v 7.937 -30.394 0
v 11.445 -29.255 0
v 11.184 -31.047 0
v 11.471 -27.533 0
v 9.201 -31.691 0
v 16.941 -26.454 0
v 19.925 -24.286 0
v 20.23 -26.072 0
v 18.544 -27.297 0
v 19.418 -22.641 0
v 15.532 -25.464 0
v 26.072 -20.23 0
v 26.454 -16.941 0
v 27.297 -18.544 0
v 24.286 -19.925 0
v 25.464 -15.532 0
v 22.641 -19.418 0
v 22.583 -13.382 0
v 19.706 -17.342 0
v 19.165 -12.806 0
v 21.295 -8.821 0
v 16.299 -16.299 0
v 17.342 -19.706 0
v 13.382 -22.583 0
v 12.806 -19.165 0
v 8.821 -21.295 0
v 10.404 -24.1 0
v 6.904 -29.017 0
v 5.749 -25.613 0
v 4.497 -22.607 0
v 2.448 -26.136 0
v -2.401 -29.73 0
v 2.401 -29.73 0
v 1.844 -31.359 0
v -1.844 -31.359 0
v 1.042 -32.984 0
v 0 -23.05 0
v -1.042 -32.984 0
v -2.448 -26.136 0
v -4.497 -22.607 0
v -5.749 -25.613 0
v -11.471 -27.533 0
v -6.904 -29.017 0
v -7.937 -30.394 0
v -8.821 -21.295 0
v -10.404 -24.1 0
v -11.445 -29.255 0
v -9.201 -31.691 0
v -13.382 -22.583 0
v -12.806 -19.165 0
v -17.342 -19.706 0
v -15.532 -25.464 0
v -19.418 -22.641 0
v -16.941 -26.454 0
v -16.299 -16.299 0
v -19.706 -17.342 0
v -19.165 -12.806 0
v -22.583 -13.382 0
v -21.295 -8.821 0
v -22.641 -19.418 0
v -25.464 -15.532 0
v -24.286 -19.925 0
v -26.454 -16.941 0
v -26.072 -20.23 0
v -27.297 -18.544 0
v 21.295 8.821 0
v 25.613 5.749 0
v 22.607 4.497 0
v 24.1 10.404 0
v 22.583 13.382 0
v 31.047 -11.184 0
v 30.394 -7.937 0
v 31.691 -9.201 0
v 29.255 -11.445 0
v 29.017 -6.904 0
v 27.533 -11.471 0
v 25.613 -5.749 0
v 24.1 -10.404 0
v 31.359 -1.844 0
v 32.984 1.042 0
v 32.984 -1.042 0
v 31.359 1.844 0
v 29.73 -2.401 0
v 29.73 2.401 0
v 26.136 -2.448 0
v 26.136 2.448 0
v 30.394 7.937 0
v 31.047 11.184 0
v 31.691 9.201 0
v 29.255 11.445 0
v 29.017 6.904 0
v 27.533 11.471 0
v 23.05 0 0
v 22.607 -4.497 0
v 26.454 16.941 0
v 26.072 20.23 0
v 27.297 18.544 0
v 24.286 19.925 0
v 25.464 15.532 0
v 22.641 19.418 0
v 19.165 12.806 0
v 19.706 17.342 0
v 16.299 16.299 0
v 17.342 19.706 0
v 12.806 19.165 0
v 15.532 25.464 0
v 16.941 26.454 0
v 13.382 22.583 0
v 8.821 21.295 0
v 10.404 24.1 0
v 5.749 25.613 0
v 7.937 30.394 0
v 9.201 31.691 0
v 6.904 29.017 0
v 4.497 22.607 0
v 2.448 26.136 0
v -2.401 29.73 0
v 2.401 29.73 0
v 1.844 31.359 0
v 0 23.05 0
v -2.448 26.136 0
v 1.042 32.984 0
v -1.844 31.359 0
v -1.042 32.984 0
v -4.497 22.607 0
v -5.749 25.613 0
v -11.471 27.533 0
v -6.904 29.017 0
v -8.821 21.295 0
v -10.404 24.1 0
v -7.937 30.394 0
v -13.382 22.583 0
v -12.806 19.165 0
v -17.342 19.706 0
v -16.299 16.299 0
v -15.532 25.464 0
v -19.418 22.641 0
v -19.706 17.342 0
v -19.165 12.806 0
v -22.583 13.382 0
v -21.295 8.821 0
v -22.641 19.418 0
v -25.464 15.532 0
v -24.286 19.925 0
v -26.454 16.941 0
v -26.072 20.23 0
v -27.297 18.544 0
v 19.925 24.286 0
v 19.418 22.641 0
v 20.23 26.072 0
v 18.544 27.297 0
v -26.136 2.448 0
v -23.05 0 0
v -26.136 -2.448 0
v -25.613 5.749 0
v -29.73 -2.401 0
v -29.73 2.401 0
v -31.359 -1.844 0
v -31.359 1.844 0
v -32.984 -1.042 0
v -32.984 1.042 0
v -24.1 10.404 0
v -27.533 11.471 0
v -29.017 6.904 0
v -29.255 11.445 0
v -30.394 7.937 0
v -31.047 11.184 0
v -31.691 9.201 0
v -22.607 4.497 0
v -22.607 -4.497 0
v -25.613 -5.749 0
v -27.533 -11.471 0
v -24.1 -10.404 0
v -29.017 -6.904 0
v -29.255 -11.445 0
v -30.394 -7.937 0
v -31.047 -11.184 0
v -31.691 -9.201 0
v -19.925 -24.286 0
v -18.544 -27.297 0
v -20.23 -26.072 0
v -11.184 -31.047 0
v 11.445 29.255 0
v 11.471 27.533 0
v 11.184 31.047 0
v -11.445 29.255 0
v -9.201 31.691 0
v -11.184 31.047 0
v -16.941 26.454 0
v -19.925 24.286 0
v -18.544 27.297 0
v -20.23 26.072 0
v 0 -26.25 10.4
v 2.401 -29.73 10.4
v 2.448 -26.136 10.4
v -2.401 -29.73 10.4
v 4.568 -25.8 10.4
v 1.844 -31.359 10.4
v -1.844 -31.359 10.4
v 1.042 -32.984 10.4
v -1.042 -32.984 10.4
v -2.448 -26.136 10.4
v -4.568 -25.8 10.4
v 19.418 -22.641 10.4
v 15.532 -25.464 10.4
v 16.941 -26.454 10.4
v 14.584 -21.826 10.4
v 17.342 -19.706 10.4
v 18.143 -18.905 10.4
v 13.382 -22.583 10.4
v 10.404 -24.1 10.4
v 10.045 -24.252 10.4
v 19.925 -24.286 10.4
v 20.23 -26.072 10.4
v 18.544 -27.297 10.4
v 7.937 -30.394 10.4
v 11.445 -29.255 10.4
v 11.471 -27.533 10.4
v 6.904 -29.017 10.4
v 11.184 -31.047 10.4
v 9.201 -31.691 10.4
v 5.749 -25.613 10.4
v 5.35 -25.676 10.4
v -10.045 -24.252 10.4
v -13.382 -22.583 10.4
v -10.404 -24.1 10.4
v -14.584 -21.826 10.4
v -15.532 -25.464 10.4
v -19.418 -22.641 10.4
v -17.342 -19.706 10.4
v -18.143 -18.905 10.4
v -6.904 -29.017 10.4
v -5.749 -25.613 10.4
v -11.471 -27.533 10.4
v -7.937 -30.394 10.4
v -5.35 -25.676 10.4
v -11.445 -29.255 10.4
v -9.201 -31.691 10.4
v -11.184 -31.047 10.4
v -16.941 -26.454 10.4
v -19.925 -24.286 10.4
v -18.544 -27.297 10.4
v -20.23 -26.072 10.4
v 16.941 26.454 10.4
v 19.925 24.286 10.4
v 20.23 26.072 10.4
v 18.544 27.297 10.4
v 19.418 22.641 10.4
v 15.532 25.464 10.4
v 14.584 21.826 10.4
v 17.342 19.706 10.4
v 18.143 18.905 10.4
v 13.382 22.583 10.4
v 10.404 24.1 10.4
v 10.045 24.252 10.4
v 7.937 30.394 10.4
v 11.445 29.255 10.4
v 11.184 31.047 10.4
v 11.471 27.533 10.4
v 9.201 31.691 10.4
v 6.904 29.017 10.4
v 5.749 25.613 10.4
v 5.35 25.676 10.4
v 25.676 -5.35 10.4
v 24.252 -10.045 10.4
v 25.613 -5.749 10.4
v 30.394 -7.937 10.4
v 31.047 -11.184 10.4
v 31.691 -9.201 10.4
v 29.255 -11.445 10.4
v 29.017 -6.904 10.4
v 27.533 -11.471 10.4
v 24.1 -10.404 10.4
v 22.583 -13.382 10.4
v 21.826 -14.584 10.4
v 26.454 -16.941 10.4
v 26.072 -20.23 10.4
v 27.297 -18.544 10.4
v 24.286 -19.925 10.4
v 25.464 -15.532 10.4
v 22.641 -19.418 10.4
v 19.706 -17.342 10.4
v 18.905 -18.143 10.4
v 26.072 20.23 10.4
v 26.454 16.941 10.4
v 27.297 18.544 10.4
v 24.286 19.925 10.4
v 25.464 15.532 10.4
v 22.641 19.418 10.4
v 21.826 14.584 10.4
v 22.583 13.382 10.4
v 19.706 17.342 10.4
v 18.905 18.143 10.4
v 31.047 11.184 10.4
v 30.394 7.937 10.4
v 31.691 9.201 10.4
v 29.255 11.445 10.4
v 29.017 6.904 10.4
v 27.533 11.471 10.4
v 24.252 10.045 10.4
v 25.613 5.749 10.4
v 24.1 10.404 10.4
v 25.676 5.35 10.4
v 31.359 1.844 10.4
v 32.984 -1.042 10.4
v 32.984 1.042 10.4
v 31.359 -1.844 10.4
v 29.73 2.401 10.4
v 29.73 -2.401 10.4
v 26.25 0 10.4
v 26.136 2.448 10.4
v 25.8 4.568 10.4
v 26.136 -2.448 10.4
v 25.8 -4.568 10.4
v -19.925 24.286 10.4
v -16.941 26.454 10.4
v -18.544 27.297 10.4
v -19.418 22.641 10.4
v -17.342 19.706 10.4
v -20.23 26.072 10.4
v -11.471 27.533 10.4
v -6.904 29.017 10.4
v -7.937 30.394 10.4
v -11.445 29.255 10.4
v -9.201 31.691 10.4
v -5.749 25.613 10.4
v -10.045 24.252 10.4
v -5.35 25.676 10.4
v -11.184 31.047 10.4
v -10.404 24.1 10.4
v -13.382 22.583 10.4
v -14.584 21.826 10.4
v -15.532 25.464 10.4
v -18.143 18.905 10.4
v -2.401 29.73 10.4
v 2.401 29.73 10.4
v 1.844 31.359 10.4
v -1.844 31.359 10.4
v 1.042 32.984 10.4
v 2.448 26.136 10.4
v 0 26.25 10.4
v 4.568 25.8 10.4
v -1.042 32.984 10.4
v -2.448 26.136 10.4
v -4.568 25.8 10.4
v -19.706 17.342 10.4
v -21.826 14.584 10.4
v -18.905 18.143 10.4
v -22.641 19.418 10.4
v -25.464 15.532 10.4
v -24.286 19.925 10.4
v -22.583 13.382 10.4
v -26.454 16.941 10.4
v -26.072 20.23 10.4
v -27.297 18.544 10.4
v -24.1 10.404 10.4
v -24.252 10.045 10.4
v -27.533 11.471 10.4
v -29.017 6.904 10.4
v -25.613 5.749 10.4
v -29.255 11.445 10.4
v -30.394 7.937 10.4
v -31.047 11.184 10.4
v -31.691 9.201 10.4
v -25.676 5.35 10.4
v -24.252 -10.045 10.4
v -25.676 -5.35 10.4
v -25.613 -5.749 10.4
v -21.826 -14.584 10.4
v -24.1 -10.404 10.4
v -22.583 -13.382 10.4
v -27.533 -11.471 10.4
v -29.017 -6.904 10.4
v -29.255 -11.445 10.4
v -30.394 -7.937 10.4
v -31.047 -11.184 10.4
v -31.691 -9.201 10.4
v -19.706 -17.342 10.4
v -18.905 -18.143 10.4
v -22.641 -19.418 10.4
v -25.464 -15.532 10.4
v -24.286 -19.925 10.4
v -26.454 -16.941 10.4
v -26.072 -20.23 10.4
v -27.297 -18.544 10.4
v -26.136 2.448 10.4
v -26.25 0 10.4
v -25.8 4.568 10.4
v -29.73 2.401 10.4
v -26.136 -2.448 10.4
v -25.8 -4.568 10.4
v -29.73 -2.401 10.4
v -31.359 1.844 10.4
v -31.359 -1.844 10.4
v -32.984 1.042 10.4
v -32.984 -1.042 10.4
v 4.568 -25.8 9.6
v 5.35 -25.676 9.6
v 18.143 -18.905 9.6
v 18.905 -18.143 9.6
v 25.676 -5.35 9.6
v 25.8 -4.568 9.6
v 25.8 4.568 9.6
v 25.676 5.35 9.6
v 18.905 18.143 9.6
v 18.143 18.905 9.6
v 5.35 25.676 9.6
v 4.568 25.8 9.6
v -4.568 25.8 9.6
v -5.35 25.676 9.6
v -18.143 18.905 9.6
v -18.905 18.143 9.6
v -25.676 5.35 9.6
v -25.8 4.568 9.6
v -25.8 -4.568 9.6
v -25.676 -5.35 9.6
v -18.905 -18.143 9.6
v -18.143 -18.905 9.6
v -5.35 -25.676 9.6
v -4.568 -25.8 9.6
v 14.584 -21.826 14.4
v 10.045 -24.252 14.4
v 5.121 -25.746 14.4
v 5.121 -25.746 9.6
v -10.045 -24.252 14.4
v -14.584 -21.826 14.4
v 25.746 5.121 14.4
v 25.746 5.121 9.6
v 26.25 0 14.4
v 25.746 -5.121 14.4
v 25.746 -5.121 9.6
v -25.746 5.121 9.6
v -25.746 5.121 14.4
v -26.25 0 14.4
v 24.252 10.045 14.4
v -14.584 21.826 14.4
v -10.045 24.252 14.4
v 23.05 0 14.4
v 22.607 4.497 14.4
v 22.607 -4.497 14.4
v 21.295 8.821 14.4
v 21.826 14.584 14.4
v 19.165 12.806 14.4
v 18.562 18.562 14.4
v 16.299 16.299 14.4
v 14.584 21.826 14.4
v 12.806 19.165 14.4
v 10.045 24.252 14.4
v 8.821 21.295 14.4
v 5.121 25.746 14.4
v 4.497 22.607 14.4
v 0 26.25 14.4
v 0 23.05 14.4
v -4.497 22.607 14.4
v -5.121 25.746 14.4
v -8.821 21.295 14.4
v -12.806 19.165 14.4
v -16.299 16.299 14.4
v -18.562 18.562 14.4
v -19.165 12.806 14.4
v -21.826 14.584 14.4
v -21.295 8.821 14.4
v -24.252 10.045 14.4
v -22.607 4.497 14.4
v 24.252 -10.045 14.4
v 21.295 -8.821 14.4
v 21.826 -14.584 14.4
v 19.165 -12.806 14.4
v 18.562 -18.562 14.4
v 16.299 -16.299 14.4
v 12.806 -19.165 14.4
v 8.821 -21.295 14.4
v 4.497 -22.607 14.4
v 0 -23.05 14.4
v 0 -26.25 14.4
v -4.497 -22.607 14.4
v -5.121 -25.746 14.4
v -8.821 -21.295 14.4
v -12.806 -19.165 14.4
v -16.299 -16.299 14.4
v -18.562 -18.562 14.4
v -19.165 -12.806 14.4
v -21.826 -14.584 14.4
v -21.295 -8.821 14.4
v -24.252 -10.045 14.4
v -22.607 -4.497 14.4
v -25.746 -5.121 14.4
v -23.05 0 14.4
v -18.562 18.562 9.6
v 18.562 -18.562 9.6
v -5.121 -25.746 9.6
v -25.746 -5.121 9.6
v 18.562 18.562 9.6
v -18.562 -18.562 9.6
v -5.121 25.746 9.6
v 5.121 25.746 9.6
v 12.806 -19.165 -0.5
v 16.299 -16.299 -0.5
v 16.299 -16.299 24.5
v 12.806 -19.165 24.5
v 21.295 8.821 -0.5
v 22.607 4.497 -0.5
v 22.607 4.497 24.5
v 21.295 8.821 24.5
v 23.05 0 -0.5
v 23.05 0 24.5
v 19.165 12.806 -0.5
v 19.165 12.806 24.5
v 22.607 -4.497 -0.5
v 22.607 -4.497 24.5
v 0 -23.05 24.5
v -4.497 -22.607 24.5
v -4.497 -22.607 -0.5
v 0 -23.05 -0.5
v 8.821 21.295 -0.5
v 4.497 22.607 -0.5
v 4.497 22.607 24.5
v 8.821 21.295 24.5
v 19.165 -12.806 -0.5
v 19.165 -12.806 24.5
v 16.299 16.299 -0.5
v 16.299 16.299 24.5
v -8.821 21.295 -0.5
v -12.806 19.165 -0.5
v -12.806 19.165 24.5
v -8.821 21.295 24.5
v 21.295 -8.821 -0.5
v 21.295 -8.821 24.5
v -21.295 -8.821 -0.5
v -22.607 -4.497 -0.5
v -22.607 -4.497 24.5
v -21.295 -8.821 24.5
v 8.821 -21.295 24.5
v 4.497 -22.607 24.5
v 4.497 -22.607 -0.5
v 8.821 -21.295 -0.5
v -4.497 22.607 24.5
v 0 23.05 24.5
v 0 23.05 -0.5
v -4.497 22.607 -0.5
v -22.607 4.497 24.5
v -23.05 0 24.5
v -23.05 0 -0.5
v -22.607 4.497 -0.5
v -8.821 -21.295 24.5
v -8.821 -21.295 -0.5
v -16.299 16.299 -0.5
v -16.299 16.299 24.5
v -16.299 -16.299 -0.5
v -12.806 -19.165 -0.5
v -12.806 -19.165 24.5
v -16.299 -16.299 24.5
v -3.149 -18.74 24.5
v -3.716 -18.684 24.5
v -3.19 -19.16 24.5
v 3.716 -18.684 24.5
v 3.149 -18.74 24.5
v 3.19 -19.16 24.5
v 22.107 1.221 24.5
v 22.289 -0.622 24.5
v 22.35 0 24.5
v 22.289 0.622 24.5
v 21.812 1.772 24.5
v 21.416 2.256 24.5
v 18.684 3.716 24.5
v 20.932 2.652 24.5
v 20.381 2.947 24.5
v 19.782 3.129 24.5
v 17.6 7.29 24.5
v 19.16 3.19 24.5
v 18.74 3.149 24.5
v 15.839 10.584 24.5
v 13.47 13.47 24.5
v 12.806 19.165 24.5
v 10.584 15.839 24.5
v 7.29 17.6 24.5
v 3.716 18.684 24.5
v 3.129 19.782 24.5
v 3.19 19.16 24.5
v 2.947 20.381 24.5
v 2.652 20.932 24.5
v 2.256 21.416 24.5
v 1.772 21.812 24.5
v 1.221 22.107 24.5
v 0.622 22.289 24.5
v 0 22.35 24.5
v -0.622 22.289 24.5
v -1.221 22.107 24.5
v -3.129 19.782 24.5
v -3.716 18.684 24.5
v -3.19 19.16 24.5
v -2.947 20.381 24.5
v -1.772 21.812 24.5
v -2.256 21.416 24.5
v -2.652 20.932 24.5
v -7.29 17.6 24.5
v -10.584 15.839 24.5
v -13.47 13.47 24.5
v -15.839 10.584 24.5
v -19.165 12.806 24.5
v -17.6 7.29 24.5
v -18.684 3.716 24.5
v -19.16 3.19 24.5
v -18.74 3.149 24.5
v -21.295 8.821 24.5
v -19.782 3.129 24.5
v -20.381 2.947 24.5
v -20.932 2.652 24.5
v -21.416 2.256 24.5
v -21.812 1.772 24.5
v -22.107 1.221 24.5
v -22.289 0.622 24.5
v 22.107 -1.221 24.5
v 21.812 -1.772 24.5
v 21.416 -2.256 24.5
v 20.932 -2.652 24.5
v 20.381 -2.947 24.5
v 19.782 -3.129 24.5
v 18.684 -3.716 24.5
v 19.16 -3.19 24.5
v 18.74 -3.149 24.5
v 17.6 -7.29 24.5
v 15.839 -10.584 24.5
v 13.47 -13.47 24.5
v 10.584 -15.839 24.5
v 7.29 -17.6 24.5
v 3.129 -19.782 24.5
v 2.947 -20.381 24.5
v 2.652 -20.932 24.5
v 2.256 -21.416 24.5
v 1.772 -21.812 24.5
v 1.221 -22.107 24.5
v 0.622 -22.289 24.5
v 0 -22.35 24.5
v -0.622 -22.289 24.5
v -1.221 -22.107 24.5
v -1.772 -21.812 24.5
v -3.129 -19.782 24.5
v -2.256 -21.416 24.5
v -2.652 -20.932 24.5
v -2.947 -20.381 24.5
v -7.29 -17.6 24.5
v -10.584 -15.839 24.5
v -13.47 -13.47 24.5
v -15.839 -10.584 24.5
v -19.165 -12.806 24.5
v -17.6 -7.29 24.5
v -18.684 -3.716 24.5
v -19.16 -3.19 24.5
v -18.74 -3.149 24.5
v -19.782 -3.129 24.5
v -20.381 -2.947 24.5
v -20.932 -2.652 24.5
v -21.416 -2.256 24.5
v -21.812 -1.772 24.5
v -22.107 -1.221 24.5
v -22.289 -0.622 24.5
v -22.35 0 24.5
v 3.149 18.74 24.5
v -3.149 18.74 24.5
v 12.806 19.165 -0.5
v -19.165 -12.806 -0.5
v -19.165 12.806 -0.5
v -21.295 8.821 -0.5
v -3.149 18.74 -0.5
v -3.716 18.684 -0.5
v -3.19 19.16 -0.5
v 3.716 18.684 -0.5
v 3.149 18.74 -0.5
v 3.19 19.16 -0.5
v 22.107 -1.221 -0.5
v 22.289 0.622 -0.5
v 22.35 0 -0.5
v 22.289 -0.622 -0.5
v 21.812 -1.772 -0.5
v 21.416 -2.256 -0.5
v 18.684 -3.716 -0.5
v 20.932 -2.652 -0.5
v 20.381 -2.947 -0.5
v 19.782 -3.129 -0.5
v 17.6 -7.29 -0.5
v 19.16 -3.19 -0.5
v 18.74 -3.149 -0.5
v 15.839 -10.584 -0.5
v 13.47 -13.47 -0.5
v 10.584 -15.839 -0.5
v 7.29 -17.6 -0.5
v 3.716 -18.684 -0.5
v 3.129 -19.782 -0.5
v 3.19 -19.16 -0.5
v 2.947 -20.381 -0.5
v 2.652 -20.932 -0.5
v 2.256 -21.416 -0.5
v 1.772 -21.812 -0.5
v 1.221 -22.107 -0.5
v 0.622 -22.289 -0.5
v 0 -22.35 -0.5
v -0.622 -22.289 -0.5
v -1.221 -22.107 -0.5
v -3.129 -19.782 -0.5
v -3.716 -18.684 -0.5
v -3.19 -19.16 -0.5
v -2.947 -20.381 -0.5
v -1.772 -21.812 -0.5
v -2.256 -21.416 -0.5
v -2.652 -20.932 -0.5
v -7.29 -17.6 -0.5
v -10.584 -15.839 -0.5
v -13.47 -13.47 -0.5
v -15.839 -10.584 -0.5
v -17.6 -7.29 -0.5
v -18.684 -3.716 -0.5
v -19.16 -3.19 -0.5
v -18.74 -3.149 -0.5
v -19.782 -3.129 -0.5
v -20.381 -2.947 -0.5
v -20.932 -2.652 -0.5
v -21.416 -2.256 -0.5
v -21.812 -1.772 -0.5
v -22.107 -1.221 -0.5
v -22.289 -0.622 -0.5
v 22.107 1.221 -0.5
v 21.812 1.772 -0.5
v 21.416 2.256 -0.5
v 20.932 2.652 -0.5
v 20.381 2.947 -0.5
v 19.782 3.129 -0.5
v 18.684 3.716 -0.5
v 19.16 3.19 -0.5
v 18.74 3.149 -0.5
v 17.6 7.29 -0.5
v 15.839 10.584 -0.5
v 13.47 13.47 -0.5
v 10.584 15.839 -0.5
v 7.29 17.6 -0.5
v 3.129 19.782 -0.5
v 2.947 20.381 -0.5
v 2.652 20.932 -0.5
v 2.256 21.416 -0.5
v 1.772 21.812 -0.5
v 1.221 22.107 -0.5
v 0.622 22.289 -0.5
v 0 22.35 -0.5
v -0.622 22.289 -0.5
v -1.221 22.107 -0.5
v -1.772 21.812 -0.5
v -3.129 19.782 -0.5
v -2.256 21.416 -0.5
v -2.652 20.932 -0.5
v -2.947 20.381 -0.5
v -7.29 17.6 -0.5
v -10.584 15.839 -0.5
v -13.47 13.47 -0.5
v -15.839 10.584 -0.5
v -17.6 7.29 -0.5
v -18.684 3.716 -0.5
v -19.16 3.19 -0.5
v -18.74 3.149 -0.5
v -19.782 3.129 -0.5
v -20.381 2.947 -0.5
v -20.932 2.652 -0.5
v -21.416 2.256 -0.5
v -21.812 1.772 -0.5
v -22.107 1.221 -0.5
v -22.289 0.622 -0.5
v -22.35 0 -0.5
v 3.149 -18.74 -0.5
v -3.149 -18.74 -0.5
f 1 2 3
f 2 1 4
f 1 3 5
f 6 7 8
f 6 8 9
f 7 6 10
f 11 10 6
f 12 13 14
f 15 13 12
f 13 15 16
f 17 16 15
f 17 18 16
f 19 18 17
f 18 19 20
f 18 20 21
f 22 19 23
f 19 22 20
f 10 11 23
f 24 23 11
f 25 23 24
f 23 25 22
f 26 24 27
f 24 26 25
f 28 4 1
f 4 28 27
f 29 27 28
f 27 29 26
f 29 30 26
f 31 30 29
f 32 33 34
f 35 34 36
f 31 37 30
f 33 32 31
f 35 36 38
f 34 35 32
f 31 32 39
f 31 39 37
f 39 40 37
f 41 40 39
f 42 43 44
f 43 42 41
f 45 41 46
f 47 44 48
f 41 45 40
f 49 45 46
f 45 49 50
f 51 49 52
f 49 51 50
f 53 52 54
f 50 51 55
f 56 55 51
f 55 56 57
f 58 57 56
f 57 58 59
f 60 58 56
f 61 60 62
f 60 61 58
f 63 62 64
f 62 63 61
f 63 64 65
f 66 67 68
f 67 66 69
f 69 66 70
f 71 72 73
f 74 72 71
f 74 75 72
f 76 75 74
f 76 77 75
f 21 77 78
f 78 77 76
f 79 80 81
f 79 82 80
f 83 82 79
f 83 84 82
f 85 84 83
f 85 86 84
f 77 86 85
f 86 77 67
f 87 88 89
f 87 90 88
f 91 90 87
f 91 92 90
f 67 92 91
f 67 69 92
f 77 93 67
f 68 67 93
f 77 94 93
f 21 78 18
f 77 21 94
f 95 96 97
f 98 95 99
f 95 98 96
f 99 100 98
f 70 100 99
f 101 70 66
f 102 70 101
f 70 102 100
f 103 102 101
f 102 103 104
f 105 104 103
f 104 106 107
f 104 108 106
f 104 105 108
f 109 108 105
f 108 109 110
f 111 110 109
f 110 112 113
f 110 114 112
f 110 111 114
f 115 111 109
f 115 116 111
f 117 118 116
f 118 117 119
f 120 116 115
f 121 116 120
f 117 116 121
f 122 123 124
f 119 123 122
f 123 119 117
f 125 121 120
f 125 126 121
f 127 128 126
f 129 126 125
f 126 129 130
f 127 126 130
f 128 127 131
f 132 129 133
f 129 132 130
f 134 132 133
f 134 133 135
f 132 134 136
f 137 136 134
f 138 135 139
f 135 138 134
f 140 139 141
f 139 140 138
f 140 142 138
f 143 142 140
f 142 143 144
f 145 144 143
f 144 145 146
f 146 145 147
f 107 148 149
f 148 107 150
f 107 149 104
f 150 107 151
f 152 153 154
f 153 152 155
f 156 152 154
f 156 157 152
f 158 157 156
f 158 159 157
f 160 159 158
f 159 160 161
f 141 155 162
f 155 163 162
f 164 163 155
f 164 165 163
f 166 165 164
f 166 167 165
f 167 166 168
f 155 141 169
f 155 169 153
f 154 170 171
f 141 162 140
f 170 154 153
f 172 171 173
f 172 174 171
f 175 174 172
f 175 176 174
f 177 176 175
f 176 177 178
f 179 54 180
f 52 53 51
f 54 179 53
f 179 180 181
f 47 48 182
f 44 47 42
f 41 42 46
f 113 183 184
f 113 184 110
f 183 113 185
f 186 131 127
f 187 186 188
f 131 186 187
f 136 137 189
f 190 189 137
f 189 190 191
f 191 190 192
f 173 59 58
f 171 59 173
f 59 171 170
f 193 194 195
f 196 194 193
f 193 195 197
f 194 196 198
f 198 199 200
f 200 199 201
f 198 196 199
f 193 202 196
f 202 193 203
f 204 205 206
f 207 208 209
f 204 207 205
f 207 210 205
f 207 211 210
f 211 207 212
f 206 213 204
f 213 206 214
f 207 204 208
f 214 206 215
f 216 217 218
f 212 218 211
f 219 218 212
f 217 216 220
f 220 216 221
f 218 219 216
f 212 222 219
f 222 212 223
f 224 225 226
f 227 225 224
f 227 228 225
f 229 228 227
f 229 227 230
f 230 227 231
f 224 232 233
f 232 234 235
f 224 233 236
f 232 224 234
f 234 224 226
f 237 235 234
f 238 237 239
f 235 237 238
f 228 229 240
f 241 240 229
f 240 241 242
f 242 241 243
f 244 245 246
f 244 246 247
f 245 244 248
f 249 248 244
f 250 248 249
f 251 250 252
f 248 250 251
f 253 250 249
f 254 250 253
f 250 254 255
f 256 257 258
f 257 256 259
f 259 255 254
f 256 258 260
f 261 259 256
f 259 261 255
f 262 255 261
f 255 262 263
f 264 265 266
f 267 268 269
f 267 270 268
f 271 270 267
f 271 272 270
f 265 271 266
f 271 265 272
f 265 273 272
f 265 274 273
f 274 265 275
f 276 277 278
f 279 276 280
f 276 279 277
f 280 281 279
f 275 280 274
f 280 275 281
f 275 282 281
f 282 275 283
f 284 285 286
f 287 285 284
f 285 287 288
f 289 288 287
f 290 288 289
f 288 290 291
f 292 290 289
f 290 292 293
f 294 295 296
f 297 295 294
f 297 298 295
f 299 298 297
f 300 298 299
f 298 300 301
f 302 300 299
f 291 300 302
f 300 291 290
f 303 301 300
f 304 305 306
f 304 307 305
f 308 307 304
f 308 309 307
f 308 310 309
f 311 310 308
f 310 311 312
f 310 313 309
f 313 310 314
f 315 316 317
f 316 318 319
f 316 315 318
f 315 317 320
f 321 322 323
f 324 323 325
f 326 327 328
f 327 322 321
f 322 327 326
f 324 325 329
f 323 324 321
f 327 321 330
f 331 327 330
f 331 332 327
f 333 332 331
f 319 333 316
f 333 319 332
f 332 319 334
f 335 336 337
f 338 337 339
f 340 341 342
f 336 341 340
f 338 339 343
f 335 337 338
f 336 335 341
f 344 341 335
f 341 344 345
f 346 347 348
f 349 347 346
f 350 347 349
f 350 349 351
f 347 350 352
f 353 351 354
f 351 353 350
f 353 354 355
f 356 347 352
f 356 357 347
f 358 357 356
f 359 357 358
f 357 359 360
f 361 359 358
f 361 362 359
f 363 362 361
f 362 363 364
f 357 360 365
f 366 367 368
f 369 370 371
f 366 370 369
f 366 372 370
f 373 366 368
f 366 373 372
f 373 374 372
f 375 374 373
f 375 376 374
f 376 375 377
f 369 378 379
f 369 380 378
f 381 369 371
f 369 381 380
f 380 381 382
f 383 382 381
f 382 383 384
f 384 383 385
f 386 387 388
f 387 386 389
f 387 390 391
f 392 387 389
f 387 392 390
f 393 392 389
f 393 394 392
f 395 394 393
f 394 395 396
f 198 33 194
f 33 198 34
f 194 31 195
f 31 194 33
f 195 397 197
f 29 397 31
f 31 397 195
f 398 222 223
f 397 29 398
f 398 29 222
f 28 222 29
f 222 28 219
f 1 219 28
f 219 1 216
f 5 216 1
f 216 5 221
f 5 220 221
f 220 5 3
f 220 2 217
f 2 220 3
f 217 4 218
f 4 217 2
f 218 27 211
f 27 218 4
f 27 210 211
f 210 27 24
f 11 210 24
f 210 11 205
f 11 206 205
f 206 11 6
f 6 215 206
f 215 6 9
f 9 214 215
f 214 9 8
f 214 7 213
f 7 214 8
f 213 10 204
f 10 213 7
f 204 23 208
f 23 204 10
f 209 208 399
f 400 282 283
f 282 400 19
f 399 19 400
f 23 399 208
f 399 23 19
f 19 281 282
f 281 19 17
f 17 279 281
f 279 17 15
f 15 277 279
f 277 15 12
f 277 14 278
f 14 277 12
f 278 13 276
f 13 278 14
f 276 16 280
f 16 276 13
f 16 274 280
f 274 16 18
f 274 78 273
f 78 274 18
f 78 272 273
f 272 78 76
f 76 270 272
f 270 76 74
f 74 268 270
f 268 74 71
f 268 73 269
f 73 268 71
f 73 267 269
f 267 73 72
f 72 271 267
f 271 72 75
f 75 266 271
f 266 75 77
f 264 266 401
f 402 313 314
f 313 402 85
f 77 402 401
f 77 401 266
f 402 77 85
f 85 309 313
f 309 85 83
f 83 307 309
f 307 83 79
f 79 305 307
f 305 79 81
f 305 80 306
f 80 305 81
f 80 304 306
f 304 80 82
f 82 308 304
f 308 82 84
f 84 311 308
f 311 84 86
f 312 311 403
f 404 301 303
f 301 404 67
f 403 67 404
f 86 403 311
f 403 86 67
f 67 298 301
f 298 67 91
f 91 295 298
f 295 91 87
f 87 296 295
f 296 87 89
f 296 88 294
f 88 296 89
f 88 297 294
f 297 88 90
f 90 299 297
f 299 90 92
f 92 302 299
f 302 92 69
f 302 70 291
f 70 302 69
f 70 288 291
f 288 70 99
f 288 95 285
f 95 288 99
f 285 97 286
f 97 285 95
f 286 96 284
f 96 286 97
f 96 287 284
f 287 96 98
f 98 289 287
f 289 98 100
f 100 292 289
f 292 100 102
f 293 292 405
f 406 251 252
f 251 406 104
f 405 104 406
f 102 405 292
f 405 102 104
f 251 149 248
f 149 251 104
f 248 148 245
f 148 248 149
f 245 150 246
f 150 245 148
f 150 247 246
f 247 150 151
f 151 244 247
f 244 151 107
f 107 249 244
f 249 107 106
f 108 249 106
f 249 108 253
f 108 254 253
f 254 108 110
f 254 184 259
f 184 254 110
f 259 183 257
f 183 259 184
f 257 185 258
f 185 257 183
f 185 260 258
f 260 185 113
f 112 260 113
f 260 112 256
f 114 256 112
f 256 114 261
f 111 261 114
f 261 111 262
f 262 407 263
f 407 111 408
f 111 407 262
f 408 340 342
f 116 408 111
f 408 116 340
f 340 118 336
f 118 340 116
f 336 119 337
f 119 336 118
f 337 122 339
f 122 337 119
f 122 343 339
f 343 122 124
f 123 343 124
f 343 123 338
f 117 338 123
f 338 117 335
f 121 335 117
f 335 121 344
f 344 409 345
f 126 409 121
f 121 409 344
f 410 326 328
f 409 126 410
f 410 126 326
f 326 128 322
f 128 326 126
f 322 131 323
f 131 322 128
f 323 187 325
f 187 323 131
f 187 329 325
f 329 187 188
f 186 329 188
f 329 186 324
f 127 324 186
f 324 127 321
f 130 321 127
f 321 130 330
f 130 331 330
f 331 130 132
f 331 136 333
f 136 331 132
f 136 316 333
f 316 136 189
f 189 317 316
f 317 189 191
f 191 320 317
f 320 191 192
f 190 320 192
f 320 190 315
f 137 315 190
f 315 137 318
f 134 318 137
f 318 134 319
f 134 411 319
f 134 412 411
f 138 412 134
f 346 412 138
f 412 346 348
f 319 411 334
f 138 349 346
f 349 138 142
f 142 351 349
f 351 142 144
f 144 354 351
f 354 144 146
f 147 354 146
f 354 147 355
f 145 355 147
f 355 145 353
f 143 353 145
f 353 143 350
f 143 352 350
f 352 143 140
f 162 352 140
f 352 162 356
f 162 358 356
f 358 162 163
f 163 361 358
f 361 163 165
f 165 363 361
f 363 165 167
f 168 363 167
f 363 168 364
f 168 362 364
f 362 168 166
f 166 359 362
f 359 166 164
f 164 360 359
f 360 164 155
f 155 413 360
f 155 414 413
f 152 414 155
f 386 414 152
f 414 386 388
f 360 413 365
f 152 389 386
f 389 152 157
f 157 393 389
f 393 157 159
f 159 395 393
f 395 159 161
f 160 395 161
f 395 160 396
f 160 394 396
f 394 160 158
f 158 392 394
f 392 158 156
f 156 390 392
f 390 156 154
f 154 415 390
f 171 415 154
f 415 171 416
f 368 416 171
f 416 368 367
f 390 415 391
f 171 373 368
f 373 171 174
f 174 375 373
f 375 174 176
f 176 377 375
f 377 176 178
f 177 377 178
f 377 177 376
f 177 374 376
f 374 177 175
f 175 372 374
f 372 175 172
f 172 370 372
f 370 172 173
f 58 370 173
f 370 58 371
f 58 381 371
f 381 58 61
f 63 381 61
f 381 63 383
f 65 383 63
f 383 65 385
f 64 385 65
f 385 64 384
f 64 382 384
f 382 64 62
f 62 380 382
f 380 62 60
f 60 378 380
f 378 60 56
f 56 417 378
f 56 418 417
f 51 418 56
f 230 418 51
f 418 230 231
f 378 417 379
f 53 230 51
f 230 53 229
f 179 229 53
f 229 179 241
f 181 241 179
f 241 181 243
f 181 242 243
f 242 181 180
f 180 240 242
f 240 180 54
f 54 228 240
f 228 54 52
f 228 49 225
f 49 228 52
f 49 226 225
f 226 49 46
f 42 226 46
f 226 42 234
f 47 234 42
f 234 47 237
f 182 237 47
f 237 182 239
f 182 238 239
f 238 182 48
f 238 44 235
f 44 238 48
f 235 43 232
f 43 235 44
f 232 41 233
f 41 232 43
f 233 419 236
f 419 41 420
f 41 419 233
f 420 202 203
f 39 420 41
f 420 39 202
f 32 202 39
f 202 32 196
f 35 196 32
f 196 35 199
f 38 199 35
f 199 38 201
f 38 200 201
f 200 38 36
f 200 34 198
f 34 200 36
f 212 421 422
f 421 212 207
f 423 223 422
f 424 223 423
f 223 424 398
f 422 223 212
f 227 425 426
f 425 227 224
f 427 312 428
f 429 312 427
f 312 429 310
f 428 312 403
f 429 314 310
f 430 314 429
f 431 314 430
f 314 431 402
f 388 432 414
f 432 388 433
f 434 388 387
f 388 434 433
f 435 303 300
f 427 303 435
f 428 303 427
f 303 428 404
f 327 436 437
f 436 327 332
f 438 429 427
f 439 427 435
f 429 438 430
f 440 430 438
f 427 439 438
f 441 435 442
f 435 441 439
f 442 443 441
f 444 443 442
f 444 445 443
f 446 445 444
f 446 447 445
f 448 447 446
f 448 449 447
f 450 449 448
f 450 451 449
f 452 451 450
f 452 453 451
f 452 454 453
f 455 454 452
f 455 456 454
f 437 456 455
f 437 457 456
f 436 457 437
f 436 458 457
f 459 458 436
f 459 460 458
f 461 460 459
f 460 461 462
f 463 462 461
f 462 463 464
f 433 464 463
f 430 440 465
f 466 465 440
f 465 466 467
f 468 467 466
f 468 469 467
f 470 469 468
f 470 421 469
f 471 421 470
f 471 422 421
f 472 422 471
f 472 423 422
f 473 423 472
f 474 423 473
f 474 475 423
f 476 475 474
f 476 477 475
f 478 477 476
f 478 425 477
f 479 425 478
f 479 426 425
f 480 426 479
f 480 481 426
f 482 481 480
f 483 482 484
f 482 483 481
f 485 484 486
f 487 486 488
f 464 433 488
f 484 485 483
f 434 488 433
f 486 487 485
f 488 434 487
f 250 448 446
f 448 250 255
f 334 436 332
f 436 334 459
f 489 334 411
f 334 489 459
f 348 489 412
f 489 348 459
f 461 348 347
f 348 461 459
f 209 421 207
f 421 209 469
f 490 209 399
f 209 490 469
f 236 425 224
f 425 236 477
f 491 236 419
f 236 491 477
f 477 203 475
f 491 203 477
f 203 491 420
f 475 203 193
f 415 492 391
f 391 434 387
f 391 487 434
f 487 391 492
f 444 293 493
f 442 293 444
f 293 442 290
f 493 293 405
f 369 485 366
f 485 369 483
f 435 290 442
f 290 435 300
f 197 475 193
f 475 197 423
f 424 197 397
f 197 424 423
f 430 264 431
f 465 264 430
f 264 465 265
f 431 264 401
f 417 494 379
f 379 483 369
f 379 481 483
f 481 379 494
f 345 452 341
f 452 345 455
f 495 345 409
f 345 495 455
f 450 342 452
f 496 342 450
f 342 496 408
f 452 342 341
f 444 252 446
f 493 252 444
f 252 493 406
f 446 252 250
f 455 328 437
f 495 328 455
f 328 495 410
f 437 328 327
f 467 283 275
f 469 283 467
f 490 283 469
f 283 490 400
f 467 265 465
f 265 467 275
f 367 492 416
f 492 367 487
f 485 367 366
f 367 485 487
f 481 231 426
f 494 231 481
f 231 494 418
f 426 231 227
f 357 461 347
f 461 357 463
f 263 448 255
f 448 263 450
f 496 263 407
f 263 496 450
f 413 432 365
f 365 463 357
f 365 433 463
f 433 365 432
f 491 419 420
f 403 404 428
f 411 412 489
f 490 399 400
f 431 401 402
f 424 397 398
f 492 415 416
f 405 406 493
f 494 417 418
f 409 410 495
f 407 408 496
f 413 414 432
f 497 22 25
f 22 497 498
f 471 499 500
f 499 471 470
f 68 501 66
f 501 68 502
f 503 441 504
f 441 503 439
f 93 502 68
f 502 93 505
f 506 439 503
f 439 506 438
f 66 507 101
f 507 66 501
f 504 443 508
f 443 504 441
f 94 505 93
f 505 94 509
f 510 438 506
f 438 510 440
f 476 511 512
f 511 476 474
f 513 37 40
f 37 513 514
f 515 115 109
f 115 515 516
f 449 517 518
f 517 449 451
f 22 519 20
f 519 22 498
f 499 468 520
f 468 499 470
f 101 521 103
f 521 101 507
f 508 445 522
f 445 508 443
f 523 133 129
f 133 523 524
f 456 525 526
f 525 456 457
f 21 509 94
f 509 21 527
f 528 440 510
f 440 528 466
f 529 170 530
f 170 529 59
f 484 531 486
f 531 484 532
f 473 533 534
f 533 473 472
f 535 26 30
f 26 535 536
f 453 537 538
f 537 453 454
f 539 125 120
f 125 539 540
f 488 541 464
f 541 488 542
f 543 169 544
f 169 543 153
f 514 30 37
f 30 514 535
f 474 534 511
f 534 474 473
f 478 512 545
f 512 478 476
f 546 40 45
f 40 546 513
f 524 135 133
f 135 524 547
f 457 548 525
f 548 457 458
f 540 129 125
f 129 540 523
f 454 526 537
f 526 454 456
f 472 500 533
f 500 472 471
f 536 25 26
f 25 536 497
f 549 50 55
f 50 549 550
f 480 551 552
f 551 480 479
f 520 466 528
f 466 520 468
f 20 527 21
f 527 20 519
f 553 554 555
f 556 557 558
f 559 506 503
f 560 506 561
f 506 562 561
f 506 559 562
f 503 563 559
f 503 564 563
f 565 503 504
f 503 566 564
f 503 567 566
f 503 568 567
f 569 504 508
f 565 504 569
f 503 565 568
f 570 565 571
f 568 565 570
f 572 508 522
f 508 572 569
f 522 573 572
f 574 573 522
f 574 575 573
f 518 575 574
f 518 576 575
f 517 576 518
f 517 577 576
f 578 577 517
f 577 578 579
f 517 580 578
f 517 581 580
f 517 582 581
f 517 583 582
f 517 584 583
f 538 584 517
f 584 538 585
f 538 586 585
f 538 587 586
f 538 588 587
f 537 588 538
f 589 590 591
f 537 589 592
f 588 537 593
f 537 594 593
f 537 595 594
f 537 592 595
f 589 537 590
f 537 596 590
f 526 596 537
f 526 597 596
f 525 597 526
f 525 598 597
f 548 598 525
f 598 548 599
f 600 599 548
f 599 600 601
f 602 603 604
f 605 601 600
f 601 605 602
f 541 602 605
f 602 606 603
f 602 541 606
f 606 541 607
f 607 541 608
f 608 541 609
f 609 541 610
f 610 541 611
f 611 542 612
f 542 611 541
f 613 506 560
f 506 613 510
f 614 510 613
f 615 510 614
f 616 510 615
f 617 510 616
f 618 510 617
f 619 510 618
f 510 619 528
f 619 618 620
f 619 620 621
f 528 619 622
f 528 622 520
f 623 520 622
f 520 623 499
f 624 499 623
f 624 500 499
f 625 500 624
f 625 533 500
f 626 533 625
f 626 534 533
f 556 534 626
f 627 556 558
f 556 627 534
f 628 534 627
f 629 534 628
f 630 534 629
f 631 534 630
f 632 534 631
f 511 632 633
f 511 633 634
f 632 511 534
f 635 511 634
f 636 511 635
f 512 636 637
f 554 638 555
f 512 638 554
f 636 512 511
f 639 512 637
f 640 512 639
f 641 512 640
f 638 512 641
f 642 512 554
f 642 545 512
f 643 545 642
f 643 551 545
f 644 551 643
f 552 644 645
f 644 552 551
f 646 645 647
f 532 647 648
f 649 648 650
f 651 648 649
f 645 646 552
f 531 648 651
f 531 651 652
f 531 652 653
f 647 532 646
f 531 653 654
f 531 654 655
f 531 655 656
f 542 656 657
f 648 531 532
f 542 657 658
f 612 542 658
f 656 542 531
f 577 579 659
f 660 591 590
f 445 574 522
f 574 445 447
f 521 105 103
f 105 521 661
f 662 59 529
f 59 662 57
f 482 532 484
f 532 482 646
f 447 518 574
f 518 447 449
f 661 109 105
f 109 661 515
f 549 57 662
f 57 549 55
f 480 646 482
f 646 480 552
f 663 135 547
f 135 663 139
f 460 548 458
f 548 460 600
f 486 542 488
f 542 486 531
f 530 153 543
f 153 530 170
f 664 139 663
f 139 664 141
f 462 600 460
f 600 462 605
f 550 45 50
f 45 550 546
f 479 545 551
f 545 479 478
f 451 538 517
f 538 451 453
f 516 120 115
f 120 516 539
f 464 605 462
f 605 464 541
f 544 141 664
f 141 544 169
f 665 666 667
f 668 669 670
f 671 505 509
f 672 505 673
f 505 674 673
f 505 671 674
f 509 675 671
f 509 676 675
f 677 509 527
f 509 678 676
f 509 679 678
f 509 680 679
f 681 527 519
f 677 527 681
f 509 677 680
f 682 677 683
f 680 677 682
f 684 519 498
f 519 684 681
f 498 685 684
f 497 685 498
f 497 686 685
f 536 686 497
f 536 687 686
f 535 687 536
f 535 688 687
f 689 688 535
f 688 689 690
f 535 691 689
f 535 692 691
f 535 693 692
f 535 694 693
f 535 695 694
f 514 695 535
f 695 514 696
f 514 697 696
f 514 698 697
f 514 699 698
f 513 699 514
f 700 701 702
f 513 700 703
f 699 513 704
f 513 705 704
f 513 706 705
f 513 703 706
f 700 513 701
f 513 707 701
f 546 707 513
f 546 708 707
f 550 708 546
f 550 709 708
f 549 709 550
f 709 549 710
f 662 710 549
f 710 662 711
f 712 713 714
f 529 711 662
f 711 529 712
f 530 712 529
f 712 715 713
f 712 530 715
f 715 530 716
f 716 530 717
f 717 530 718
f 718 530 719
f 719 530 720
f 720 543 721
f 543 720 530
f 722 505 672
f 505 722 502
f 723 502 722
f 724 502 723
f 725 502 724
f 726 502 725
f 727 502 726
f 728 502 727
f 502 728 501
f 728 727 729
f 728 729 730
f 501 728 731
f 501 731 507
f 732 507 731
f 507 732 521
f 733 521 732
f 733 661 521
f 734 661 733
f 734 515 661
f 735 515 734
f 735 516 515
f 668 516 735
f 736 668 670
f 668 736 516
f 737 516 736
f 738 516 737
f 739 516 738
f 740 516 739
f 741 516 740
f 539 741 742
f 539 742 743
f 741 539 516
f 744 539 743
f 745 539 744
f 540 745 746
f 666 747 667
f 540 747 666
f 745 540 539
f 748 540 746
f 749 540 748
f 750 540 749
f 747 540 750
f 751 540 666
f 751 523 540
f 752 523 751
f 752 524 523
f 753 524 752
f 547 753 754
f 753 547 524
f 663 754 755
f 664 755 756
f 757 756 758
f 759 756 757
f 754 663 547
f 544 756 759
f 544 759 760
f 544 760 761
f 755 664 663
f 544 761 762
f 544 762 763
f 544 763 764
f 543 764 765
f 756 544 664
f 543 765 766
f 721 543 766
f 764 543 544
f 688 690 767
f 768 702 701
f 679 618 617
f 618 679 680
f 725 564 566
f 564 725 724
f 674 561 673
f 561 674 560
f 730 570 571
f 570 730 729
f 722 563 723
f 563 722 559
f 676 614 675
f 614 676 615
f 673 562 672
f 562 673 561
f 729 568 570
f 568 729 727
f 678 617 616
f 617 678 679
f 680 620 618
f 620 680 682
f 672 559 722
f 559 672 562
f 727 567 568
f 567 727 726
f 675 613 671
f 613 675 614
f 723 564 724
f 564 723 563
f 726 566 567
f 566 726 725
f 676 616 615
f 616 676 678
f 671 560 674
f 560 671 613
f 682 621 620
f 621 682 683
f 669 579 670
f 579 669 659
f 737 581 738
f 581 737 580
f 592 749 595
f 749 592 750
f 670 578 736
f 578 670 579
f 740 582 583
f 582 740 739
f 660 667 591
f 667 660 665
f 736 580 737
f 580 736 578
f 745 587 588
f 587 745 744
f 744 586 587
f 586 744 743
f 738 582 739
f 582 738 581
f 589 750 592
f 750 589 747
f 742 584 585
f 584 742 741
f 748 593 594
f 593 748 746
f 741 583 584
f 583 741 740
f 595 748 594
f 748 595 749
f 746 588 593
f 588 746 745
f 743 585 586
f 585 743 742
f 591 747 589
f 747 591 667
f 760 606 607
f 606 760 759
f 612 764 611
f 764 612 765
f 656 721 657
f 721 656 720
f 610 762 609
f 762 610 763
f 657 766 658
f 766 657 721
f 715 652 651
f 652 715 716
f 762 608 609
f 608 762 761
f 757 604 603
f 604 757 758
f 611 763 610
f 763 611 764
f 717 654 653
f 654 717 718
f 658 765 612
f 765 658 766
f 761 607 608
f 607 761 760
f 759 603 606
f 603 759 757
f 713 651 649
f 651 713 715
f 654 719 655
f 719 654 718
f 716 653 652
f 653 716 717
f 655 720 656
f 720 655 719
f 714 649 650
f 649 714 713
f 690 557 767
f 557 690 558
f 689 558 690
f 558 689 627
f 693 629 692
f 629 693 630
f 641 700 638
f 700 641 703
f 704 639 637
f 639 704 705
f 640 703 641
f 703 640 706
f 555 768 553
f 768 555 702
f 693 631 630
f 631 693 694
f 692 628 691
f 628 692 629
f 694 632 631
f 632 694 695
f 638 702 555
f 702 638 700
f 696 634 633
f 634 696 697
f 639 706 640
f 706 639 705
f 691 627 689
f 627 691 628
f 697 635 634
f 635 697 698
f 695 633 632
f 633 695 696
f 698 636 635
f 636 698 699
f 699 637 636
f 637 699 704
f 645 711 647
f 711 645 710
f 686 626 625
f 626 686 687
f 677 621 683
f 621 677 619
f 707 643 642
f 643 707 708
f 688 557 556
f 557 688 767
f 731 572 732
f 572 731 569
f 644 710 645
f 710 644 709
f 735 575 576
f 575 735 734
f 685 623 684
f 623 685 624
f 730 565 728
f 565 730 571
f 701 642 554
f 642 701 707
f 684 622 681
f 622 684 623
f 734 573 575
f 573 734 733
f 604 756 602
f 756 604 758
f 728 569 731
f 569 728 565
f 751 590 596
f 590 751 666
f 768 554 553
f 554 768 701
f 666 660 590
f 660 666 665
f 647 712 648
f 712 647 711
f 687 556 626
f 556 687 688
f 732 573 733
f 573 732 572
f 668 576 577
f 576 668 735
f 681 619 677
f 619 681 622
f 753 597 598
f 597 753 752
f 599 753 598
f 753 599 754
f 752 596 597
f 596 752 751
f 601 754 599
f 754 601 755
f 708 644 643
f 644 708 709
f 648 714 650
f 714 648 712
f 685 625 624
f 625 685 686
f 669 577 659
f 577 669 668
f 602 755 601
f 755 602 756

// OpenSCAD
$fn = 32;

// ----------------------------------------------------------------------
// Two-module gear rim: z20 m3 and z18 m1.8, 24 mm wide
// ----------------------------------------------------------------------

// --- parameters (mm) ---
module_a = 3;             // first tooth module
teeth_a = 20;             // first band tooth count
module_b = 1.8;           // second tooth module
teeth_b = 18;             // second band tooth count
band_h = 10;              // height of one tooth band
web_t = 4;                // web thickness between the bands
total = 24;               // overall width over both bands
root_r = 26.25;           // root radius of the coarse band
hub_r = 23.05;            // hub radius
bore_d = 38.1;            // hub bore
hole_count = 4;           // lightening holes
hole_r = 19.16;           // lightening hole circle radius
hole_d = 6.38;            // lightening hole diameter

band_a = [[26.136, -2.448], [29.73, -2.401], [31.359, -1.844], [32.984, -1.042], [32.984, 1.042], [31.359, 1.844], [29.73, 2.401], [26.136, 2.448], [25.613, 5.749], [29.017, 6.904], [30.394, 7.937], [31.691, 9.201], [31.047, 11.184], [29.255, 11.445], [27.533, 11.471], [24.1, 10.404], [22.583, 13.382], [25.464, 15.532], [26.454, 16.941], [27.297, 18.544], [26.072, 20.23], [24.286, 19.925], [22.641, 19.418], [19.706, 17.342], [17.342, 19.706], [19.418, 22.641], [19.925, 24.286], [20.23, 26.072], [18.544, 27.297], [16.941, 26.454], [15.532, 25.464], [13.382, 22.583], [10.404, 24.1], [11.471, 27.533], [11.445, 29.255], [11.184, 31.047], [9.201, 31.691], [7.937, 30.394], [6.904, 29.017], [5.749, 25.613], [2.448, 26.136], [2.401, 29.73], [1.844, 31.359], [1.042, 32.984], [-1.042, 32.984], [-1.844, 31.359], [-2.401, 29.73], [-2.448, 26.136], [-5.749, 25.613], [-6.904, 29.017], [-7.937, 30.394], [-9.201, 31.691], [-11.184, 31.047], [-11.445, 29.255], [-11.471, 27.533], [-10.404, 24.1], [-13.382, 22.583], [-15.532, 25.464], [-16.941, 26.454], [-18.544, 27.297], [-20.23, 26.072], [-19.925, 24.286], [-19.418, 22.641], [-17.342, 19.706], [-19.706, 17.342], [-22.641, 19.418], [-24.286, 19.925], [-26.072, 20.23], [-27.297, 18.544], [-26.454, 16.941], [-25.464, 15.532], [-22.583, 13.382], [-24.1, 10.404], [-27.533, 11.471], [-29.255, 11.445], [-31.047, 11.184], [-31.691, 9.201], [-30.394, 7.937], [-29.017, 6.904], [-25.613, 5.749], [-26.136, 2.448], [-29.73, 2.401], [-31.359, 1.844], [-32.984, 1.042], [-32.984, -1.042], [-31.359, -1.844], [-29.73, -2.401], [-26.136, -2.448], [-25.613, -5.749], [-29.017, -6.904], [-30.394, -7.937], [-31.691, -9.201], [-31.047, -11.184], [-29.255, -11.445], [-27.533, -11.471], [-24.1, -10.404], [-22.583, -13.382], [-25.464, -15.532], [-26.454, -16.941], [-27.297, -18.544], [-26.072, -20.23], [-24.286, -19.925], [-22.641, -19.418], [-19.706, -17.342], [-17.342, -19.706], [-19.418, -22.641], [-19.925, -24.286], [-20.23, -26.072], [-18.544, -27.297], [-16.941, -26.454], [-15.532, -25.464], [-13.382, -22.583], [-10.404, -24.1], [-11.471, -27.533], [-11.445, -29.255], [-11.184, -31.047], [-9.201, -31.691], [-7.937, -30.394], [-6.904, -29.017], [-5.749, -25.613], [-2.448, -26.136], [-2.401, -29.73], [-1.844, -31.359], [-1.042, -32.984], [1.042, -32.984], [1.844, -31.359], [2.401, -29.73], [2.448, -26.136], [5.749, -25.613], [6.904, -29.017], [7.937, -30.394], [9.201, -31.691], [11.184, -31.047], [11.445, -29.255], [11.471, -27.533], [10.404, -24.1], [13.382, -22.583], [15.532, -25.464], [16.941, -26.454], [18.544, -27.297], [20.23, -26.072], [19.925, -24.286], [19.418, -22.641], [17.342, -19.706], [19.706, -17.342], [22.641, -19.418], [24.286, -19.925], [26.072, -20.23], [27.297, -18.544], [26.454, -16.941], [25.464, -15.532], [22.583, -13.382], [24.1, -10.404], [27.533, -11.471], [29.255, -11.445], [31.047, -11.184], [31.691, -9.201], [30.394, -7.937], [29.017, -6.904], [25.613, -5.749]];
band_b = [[13.878, -1.42], [16.12, -1.417], [17.056, -1.088], [17.99, -0.613], [17.99, 0.613], [17.056, 1.088], [16.12, 1.417], [13.878, 1.42], [13.526, 3.412], [15.632, 4.182], [16.4, 4.811], [17.114, 5.576], [16.695, 6.729], [15.656, 6.856], [14.663, 6.845], [12.555, 6.081], [11.544, 7.832], [13.259, 9.276], [13.765, 10.13], [14.175, 11.094], [13.387, 12.033], [12.366, 11.797], [11.438, 11.447], [9.718, 10.008], [8.169, 11.308], [9.287, 13.252], [9.471, 14.227], [9.526, 15.273], [8.464, 15.886], [7.586, 15.315], [6.833, 14.669], [5.709, 12.728], [3.809, 13.42], [4.195, 15.629], [4.033, 16.608], [3.728, 17.61], [2.52, 17.823], [1.89, 16.986], [1.404, 16.121], [1.011, 13.913], [-1.011, 13.913], [-1.404, 16.121], [-1.89, 16.986], [-2.52, 17.823], [-3.728, 17.61], [-4.033, 16.608], [-4.195, 15.629], [-3.809, 13.42], [-5.709, 12.728], [-6.833, 14.669], [-7.586, 15.315], [-8.464, 15.886], [-9.526, 15.273], [-9.471, 14.227], [-9.287, 13.252], [-8.169, 11.308], [-9.718, 10.008], [-11.438, 11.447], [-12.366, 11.797], [-13.387, 12.033], [-14.175, 11.094], [-13.765, 10.13], [-13.259, 9.276], [-11.544, 7.832], [-12.555, 6.081], [-14.663, 6.845], [-15.656, 6.856], [-16.695, 6.729], [-17.114, 5.576], [-16.4, 4.811], [-15.632, 4.182], [-13.526, 3.412], [-13.878, 1.42], [-16.12, 1.417], [-17.056, 1.088], [-17.99, 0.613], [-17.99, -0.613], [-17.056, -1.088], [-16.12, -1.417], [-13.878, -1.42], [-13.526, -3.412], [-15.632, -4.182], [-16.4, -4.811], [-17.114, -5.576], [-16.695, -6.729], [-15.656, -6.856], [-14.663, -6.845], [-12.555, -6.081], [-11.544, -7.832], [-13.259, -9.276], [-13.765, -10.13], [-14.175, -11.094], [-13.387, -12.033], [-12.366, -11.797], [-11.438, -11.447], [-9.718, -10.008], [-8.169, -11.308], [-9.287, -13.252], [-9.471, -14.227], [-9.526, -15.273], [-8.464, -15.886], [-7.586, -15.315], [-6.833, -14.669], [-5.709, -12.728], [-3.809, -13.42], [-4.195, -15.629], [-4.033, -16.608], [-3.728, -17.61], [-2.52, -17.823], [-1.89, -16.986], [-1.404, -16.121], [-1.011, -13.913], [1.011, -13.913], [1.404, -16.121], [1.89, -16.986], [2.52, -17.823], [3.728, -17.61], [4.033, -16.608], [4.195, -15.629], [3.809, -13.42], [5.709, -12.728], [6.833, -14.669], [7.586, -15.315], [8.464, -15.886], [9.526, -15.273], [9.471, -14.227], [9.287, -13.252], [8.169, -11.308], [9.718, -10.008], [11.438, -11.447], [12.366, -11.797], [13.387, -12.033], [14.175, -11.094], [13.765, -10.13], [13.259, -9.276], [11.544, -7.832], [12.555, -6.081], [14.663, -6.845], [15.656, -6.856], [16.695, -6.729], [17.114, -5.576], [16.4, -4.811], [15.632, -4.182], [13.526, -3.412]];

difference() {
  union() {
    /* tooth band A, overlapping the web by 0.4 mm */
    linear_extrude(height = band_h + 0.4) polygon(band_a);
    /* web */
    translate([0, 0, band_h - 0.4]) cylinder(h = web_t + 0.8, d = 2 * root_r);
    /* tooth band B */
    translate([0, 0, band_h + web_t]) linear_extrude(height = band_h + 0.4) polygon(band_b);
    /* hub */
    translate([0, 0, -0.5]) cylinder(h = total + 1.0, d = 2 * hub_r);
  }
  /* bore */
  translate([0, 0, -2.5]) cylinder(h = total + 5, d = bore_d);
  /* lightening holes through the web */
  for (i = [0 : hole_count - 1]) {
    a = i * 360 / hole_count;
    translate([hole_r * cos(a), hole_r * sin(a), -2.5]) cylinder(h = total + 5, d = hole_d);
  }
}
